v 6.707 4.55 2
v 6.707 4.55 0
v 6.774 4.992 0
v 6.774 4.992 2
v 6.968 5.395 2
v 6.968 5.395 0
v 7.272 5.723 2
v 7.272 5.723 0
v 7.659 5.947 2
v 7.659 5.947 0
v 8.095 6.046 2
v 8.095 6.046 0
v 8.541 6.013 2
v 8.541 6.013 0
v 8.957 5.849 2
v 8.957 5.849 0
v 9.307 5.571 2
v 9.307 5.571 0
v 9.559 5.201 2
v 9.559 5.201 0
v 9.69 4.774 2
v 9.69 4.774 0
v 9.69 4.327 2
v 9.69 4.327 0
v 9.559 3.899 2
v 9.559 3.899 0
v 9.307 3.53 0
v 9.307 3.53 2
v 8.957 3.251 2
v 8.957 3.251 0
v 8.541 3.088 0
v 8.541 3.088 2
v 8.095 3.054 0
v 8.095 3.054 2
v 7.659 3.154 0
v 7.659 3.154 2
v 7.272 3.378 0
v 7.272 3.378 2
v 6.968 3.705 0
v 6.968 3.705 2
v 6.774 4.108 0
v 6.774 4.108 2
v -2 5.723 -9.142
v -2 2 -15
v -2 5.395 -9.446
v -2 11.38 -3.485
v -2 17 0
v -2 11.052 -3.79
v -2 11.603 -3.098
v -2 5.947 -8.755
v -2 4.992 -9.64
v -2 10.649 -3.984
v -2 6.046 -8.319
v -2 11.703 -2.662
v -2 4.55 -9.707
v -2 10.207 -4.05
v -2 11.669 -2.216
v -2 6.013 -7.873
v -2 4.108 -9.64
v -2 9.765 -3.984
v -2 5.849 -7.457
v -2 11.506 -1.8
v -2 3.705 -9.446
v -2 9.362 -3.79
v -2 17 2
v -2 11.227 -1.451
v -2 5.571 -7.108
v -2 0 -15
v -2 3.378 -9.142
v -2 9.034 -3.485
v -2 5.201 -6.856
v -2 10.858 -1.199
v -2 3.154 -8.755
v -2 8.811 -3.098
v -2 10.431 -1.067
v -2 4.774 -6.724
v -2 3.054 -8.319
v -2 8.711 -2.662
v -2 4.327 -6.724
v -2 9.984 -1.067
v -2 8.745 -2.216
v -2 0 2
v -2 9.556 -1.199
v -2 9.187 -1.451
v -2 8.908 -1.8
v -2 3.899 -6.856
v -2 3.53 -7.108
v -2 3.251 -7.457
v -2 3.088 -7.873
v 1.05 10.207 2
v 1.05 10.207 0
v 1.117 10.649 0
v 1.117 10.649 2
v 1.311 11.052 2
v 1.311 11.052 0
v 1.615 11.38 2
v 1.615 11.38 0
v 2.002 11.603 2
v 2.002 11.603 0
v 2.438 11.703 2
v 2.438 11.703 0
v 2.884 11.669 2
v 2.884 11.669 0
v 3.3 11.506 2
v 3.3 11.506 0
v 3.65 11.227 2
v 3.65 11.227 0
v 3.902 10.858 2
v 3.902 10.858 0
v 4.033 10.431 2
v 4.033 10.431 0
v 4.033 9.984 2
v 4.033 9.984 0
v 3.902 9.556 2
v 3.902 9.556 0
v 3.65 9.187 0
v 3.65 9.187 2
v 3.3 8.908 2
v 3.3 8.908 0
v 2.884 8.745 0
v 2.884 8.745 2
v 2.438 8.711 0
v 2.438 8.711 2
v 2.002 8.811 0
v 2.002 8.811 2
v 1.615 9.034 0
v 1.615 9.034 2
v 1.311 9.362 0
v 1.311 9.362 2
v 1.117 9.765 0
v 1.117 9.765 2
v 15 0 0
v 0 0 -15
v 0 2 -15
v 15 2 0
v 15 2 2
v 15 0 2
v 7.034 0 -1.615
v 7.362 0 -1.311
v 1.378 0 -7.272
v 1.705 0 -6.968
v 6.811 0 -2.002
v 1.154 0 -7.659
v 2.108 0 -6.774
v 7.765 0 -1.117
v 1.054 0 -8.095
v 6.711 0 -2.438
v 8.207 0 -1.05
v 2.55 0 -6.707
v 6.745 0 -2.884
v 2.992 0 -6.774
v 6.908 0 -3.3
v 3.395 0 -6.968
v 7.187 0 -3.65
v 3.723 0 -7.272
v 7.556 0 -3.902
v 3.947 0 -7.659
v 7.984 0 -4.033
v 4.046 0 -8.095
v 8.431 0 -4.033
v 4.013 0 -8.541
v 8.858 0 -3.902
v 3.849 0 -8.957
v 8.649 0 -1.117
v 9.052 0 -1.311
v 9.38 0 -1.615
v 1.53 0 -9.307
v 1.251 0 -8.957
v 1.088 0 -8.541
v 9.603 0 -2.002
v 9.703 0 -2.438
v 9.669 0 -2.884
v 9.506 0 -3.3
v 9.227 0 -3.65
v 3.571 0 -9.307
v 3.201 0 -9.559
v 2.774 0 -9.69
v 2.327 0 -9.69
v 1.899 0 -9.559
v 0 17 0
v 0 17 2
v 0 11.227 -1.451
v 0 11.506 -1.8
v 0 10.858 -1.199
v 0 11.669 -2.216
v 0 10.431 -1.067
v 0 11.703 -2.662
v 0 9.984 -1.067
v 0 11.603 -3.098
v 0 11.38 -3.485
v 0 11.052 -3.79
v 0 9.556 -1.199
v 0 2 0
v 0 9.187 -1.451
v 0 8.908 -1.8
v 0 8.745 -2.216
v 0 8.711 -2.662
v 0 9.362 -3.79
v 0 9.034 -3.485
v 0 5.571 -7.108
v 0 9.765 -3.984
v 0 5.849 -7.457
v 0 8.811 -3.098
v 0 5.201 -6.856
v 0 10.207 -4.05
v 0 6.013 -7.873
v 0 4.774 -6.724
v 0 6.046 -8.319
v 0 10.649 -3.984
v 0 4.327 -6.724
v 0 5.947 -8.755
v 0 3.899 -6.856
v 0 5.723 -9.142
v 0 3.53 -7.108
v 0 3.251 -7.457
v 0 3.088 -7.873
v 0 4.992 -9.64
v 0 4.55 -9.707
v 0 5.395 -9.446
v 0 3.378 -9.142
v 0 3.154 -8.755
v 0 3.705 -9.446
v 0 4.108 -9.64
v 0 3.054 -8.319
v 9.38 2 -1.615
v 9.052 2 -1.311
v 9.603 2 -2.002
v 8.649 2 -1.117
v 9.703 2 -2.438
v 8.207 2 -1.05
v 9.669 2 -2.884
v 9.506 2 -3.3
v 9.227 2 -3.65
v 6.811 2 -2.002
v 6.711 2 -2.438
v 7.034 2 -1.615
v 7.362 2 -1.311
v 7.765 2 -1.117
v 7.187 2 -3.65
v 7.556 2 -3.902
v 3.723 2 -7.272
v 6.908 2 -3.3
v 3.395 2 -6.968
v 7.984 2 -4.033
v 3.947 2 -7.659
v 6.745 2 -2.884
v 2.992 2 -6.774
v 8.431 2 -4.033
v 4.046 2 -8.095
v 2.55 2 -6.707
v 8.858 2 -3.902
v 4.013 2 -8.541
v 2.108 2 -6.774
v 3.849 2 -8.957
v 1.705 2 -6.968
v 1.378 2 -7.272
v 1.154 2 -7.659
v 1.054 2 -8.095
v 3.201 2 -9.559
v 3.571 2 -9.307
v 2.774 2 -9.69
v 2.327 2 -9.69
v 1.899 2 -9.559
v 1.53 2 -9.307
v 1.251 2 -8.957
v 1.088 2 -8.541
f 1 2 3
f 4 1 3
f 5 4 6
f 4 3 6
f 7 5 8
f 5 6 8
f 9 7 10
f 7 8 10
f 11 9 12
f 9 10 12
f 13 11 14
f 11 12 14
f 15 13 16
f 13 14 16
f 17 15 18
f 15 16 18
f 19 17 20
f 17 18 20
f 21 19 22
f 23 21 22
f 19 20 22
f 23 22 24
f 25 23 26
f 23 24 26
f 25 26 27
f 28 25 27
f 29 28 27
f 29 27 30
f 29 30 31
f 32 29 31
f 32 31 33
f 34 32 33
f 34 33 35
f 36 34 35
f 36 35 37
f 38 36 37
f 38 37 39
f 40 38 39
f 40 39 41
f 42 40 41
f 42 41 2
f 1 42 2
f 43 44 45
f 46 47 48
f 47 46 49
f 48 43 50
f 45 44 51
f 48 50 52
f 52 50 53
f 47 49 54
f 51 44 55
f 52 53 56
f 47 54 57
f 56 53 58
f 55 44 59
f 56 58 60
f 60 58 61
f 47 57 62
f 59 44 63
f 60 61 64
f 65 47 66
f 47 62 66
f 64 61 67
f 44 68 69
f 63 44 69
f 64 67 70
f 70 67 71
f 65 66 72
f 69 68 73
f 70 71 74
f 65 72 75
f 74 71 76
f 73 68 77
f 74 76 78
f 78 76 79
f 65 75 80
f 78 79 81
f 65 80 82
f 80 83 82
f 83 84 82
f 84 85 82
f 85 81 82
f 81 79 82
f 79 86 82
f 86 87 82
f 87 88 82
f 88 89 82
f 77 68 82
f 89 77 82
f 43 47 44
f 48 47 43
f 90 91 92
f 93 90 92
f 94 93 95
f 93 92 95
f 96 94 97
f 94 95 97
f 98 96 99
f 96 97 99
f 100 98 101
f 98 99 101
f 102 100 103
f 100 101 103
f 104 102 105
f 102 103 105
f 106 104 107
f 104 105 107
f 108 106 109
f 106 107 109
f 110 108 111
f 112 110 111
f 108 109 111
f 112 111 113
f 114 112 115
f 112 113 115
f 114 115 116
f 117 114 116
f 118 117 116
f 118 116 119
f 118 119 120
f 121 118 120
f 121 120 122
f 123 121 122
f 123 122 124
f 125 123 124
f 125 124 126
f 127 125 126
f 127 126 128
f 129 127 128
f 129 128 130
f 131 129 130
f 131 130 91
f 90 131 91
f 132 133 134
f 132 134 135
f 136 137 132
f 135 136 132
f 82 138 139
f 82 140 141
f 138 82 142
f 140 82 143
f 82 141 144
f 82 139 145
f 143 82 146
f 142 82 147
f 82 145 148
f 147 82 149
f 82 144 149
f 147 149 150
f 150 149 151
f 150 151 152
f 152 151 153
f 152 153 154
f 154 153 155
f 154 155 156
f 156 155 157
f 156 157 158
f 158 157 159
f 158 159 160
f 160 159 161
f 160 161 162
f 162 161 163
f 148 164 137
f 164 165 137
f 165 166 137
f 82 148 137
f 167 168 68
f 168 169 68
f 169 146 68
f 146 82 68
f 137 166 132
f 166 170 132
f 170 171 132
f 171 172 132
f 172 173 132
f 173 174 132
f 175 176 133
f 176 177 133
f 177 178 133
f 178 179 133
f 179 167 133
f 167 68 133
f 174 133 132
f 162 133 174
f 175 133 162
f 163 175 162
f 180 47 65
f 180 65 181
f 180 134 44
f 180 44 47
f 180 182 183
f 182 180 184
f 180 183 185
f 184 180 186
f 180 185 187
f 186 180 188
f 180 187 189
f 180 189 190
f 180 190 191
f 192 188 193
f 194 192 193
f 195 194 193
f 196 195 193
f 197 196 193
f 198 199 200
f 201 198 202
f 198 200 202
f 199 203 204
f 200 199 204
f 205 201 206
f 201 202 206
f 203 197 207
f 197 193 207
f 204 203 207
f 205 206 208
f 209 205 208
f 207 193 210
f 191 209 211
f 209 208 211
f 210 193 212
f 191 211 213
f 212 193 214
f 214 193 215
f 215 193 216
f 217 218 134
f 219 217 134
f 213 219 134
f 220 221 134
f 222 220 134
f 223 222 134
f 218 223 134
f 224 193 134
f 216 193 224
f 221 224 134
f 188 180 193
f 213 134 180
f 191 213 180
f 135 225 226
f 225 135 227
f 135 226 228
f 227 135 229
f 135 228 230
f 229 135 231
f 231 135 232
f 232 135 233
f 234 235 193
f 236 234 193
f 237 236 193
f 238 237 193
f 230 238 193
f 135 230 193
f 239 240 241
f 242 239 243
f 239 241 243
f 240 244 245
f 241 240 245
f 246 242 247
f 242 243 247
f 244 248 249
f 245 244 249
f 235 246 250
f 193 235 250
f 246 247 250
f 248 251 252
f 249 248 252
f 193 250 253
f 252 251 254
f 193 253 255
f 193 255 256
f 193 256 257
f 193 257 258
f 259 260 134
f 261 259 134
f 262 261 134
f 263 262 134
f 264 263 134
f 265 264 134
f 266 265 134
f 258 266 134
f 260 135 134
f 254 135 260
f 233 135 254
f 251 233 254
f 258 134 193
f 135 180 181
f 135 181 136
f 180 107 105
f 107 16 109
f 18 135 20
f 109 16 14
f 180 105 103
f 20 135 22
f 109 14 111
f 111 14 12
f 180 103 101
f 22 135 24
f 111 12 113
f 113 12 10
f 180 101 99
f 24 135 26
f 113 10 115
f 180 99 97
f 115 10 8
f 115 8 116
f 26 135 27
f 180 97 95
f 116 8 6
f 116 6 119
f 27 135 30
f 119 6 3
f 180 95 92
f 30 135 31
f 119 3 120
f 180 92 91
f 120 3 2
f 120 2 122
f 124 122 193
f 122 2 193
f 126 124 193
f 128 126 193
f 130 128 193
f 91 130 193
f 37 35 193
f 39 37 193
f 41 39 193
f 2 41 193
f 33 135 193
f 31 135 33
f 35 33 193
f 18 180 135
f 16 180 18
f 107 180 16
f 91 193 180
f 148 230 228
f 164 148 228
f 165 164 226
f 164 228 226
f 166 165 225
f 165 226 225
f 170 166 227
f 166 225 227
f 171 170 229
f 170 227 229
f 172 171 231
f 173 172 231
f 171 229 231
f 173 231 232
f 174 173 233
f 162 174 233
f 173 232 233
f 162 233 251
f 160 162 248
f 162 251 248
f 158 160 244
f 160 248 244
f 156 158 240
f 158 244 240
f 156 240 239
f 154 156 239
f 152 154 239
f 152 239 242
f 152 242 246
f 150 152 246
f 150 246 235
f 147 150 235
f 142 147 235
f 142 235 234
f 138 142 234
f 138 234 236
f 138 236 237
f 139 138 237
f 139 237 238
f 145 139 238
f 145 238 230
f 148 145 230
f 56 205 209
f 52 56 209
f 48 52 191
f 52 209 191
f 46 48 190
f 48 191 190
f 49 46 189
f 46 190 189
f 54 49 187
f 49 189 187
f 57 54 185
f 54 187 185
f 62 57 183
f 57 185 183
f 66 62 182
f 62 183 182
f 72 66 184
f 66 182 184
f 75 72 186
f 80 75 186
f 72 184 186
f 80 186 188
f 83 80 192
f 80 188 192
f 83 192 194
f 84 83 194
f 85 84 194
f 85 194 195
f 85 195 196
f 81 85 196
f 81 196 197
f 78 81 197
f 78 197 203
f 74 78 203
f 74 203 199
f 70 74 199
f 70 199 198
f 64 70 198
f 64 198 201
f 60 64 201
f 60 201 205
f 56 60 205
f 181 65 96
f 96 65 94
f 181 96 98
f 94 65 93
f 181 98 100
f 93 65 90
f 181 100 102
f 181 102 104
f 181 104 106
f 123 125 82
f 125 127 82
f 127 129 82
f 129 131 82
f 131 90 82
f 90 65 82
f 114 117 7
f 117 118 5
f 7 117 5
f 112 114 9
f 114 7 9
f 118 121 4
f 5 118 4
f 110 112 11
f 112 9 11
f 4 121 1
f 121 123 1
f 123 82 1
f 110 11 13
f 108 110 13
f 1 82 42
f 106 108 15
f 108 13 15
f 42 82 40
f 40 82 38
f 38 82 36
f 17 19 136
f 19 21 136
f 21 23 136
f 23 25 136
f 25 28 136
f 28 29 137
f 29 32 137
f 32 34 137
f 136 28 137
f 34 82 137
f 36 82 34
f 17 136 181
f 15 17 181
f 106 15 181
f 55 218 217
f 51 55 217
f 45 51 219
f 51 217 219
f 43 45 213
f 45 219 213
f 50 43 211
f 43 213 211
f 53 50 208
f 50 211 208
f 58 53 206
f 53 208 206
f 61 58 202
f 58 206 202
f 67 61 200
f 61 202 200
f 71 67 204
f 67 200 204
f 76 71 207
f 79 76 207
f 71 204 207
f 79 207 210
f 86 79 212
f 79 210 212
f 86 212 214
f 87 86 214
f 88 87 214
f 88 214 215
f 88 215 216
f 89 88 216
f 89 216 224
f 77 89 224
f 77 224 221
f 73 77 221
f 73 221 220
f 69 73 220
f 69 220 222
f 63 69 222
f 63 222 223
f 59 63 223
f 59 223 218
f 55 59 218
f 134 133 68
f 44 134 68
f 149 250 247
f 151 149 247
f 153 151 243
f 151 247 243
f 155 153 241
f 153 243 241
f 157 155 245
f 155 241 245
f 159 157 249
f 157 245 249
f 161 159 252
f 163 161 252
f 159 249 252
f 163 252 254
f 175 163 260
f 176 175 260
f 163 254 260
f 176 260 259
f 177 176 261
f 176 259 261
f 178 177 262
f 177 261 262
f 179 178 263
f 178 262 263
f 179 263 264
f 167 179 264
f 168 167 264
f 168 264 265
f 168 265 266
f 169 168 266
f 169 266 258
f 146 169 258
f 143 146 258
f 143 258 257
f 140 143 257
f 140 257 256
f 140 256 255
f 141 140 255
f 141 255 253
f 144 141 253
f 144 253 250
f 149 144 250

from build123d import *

# Parameters (mm, degrees)
BOSS_EXTRUDE1_DEPTH      = 2
BOSS_EXTRUDE2_DEPTH      = 15
BOSS_EXTRUDE2_DEPTH_BACK = 2
CUT_EXTRUDE1_DEPTH       = 15
CUT_EXTRUDE2_DEPTH       = 15
SKETCH5_R                = 1.5
CUT_EXTRUDE3_DEPTH       = 15
SKETCH6_R                = 1.5
CUT_EXTRUDE4_DEPTH       = 15
SKETCH7_R                = 1.5
CUT_EXTRUDE5_DEPTH       = 15


with BuildPart() as part:
    # Sketch1 → Boss-Extrude1 (new body)
    with BuildSketch(Plane(origin=(0, 0, 0), x_dir=(1, 0, 0), z_dir=(0, 1, 0))):
        Polygon((0, 15), (15, 0), (0, 0), align=None)
    extrude(amount=BOSS_EXTRUDE1_DEPTH)

    # Sketch2 → Boss-Extrude2 (add, two sides: drawn at the far end of the back side and taken through both)
    with BuildSketch(Plane(origin=(0, 2, 0), x_dir=(1, 0, 0), z_dir=(0, 1, 0)).offset(-BOSS_EXTRUDE2_DEPTH_BACK)):
        Polygon((-2, -2), (15, -2), (15, 0), (0, 0), (0, 15), (-2, 15), align=None)
    extrude(amount=BOSS_EXTRUDE2_DEPTH + BOSS_EXTRUDE2_DEPTH_BACK)

    # Sketch3 → Cut-Extrude1 (cut)
    with BuildSketch(Plane(origin=(0, 0, 0), x_dir=(0, 0, -1), z_dir=(1, 0, 0))):
        Polygon((15, 2), (0, 17), (15, 17), align=None)
    extrude(amount=-CUT_EXTRUDE1_DEPTH, mode=Mode.SUBTRACT)

    # Sketch4 → Cut-Extrude2 (cut)
    with BuildSketch(Plane(origin=(0, 0, 0), x_dir=(-1, 0, 0), z_dir=(0, 0, -1))):
        Polygon((0, 17), (-15, 2), (-15, 17), align=None)
    extrude(amount=-CUT_EXTRUDE2_DEPTH, mode=Mode.SUBTRACT)

    # Sketch5 → Cut-Extrude3 (cut)
    with BuildSketch(Plane(origin=(0, 0, 0), x_dir=(0, 0, -1), z_dir=(1, 0, 0))):
        with Locations((2.550252532, 10.207106781)):
            Circle(SKETCH5_R)
        with Locations((8.207106781, 4.550252532)):
            Circle(SKETCH5_R)
    extrude(amount=-CUT_EXTRUDE3_DEPTH, mode=Mode.SUBTRACT)

    # Sketch6 → Cut-Extrude4 (cut)
    with BuildSketch(Plane(origin=(0, 0, 0), x_dir=(-1, 0, 0), z_dir=(0, 0, -1))):
        with Locations((-2.550252532, 10.207106781)):
            Circle(SKETCH6_R)
        with Locations((-8.207106781, 4.550252532)):
            Circle(SKETCH6_R)
    extrude(amount=-CUT_EXTRUDE4_DEPTH, mode=Mode.SUBTRACT)

    # Sketch7 → Cut-Extrude5 (cut)
    with BuildSketch(Plane(origin=(0, 2, 0), x_dir=(1, 0, 0), z_dir=(0, 1, 0))):
        with Locations(Location((2.550252532, 8.207106781, 0), (0, 0, 270))):
            Circle(SKETCH7_R)
        with Locations(Location((8.207106781, 2.550252532, 0), (0, 0, 270))):
            Circle(SKETCH7_R)
    extrude(amount=-CUT_EXTRUDE5_DEPTH, mode=Mode.SUBTRACT)


solid = part.part
